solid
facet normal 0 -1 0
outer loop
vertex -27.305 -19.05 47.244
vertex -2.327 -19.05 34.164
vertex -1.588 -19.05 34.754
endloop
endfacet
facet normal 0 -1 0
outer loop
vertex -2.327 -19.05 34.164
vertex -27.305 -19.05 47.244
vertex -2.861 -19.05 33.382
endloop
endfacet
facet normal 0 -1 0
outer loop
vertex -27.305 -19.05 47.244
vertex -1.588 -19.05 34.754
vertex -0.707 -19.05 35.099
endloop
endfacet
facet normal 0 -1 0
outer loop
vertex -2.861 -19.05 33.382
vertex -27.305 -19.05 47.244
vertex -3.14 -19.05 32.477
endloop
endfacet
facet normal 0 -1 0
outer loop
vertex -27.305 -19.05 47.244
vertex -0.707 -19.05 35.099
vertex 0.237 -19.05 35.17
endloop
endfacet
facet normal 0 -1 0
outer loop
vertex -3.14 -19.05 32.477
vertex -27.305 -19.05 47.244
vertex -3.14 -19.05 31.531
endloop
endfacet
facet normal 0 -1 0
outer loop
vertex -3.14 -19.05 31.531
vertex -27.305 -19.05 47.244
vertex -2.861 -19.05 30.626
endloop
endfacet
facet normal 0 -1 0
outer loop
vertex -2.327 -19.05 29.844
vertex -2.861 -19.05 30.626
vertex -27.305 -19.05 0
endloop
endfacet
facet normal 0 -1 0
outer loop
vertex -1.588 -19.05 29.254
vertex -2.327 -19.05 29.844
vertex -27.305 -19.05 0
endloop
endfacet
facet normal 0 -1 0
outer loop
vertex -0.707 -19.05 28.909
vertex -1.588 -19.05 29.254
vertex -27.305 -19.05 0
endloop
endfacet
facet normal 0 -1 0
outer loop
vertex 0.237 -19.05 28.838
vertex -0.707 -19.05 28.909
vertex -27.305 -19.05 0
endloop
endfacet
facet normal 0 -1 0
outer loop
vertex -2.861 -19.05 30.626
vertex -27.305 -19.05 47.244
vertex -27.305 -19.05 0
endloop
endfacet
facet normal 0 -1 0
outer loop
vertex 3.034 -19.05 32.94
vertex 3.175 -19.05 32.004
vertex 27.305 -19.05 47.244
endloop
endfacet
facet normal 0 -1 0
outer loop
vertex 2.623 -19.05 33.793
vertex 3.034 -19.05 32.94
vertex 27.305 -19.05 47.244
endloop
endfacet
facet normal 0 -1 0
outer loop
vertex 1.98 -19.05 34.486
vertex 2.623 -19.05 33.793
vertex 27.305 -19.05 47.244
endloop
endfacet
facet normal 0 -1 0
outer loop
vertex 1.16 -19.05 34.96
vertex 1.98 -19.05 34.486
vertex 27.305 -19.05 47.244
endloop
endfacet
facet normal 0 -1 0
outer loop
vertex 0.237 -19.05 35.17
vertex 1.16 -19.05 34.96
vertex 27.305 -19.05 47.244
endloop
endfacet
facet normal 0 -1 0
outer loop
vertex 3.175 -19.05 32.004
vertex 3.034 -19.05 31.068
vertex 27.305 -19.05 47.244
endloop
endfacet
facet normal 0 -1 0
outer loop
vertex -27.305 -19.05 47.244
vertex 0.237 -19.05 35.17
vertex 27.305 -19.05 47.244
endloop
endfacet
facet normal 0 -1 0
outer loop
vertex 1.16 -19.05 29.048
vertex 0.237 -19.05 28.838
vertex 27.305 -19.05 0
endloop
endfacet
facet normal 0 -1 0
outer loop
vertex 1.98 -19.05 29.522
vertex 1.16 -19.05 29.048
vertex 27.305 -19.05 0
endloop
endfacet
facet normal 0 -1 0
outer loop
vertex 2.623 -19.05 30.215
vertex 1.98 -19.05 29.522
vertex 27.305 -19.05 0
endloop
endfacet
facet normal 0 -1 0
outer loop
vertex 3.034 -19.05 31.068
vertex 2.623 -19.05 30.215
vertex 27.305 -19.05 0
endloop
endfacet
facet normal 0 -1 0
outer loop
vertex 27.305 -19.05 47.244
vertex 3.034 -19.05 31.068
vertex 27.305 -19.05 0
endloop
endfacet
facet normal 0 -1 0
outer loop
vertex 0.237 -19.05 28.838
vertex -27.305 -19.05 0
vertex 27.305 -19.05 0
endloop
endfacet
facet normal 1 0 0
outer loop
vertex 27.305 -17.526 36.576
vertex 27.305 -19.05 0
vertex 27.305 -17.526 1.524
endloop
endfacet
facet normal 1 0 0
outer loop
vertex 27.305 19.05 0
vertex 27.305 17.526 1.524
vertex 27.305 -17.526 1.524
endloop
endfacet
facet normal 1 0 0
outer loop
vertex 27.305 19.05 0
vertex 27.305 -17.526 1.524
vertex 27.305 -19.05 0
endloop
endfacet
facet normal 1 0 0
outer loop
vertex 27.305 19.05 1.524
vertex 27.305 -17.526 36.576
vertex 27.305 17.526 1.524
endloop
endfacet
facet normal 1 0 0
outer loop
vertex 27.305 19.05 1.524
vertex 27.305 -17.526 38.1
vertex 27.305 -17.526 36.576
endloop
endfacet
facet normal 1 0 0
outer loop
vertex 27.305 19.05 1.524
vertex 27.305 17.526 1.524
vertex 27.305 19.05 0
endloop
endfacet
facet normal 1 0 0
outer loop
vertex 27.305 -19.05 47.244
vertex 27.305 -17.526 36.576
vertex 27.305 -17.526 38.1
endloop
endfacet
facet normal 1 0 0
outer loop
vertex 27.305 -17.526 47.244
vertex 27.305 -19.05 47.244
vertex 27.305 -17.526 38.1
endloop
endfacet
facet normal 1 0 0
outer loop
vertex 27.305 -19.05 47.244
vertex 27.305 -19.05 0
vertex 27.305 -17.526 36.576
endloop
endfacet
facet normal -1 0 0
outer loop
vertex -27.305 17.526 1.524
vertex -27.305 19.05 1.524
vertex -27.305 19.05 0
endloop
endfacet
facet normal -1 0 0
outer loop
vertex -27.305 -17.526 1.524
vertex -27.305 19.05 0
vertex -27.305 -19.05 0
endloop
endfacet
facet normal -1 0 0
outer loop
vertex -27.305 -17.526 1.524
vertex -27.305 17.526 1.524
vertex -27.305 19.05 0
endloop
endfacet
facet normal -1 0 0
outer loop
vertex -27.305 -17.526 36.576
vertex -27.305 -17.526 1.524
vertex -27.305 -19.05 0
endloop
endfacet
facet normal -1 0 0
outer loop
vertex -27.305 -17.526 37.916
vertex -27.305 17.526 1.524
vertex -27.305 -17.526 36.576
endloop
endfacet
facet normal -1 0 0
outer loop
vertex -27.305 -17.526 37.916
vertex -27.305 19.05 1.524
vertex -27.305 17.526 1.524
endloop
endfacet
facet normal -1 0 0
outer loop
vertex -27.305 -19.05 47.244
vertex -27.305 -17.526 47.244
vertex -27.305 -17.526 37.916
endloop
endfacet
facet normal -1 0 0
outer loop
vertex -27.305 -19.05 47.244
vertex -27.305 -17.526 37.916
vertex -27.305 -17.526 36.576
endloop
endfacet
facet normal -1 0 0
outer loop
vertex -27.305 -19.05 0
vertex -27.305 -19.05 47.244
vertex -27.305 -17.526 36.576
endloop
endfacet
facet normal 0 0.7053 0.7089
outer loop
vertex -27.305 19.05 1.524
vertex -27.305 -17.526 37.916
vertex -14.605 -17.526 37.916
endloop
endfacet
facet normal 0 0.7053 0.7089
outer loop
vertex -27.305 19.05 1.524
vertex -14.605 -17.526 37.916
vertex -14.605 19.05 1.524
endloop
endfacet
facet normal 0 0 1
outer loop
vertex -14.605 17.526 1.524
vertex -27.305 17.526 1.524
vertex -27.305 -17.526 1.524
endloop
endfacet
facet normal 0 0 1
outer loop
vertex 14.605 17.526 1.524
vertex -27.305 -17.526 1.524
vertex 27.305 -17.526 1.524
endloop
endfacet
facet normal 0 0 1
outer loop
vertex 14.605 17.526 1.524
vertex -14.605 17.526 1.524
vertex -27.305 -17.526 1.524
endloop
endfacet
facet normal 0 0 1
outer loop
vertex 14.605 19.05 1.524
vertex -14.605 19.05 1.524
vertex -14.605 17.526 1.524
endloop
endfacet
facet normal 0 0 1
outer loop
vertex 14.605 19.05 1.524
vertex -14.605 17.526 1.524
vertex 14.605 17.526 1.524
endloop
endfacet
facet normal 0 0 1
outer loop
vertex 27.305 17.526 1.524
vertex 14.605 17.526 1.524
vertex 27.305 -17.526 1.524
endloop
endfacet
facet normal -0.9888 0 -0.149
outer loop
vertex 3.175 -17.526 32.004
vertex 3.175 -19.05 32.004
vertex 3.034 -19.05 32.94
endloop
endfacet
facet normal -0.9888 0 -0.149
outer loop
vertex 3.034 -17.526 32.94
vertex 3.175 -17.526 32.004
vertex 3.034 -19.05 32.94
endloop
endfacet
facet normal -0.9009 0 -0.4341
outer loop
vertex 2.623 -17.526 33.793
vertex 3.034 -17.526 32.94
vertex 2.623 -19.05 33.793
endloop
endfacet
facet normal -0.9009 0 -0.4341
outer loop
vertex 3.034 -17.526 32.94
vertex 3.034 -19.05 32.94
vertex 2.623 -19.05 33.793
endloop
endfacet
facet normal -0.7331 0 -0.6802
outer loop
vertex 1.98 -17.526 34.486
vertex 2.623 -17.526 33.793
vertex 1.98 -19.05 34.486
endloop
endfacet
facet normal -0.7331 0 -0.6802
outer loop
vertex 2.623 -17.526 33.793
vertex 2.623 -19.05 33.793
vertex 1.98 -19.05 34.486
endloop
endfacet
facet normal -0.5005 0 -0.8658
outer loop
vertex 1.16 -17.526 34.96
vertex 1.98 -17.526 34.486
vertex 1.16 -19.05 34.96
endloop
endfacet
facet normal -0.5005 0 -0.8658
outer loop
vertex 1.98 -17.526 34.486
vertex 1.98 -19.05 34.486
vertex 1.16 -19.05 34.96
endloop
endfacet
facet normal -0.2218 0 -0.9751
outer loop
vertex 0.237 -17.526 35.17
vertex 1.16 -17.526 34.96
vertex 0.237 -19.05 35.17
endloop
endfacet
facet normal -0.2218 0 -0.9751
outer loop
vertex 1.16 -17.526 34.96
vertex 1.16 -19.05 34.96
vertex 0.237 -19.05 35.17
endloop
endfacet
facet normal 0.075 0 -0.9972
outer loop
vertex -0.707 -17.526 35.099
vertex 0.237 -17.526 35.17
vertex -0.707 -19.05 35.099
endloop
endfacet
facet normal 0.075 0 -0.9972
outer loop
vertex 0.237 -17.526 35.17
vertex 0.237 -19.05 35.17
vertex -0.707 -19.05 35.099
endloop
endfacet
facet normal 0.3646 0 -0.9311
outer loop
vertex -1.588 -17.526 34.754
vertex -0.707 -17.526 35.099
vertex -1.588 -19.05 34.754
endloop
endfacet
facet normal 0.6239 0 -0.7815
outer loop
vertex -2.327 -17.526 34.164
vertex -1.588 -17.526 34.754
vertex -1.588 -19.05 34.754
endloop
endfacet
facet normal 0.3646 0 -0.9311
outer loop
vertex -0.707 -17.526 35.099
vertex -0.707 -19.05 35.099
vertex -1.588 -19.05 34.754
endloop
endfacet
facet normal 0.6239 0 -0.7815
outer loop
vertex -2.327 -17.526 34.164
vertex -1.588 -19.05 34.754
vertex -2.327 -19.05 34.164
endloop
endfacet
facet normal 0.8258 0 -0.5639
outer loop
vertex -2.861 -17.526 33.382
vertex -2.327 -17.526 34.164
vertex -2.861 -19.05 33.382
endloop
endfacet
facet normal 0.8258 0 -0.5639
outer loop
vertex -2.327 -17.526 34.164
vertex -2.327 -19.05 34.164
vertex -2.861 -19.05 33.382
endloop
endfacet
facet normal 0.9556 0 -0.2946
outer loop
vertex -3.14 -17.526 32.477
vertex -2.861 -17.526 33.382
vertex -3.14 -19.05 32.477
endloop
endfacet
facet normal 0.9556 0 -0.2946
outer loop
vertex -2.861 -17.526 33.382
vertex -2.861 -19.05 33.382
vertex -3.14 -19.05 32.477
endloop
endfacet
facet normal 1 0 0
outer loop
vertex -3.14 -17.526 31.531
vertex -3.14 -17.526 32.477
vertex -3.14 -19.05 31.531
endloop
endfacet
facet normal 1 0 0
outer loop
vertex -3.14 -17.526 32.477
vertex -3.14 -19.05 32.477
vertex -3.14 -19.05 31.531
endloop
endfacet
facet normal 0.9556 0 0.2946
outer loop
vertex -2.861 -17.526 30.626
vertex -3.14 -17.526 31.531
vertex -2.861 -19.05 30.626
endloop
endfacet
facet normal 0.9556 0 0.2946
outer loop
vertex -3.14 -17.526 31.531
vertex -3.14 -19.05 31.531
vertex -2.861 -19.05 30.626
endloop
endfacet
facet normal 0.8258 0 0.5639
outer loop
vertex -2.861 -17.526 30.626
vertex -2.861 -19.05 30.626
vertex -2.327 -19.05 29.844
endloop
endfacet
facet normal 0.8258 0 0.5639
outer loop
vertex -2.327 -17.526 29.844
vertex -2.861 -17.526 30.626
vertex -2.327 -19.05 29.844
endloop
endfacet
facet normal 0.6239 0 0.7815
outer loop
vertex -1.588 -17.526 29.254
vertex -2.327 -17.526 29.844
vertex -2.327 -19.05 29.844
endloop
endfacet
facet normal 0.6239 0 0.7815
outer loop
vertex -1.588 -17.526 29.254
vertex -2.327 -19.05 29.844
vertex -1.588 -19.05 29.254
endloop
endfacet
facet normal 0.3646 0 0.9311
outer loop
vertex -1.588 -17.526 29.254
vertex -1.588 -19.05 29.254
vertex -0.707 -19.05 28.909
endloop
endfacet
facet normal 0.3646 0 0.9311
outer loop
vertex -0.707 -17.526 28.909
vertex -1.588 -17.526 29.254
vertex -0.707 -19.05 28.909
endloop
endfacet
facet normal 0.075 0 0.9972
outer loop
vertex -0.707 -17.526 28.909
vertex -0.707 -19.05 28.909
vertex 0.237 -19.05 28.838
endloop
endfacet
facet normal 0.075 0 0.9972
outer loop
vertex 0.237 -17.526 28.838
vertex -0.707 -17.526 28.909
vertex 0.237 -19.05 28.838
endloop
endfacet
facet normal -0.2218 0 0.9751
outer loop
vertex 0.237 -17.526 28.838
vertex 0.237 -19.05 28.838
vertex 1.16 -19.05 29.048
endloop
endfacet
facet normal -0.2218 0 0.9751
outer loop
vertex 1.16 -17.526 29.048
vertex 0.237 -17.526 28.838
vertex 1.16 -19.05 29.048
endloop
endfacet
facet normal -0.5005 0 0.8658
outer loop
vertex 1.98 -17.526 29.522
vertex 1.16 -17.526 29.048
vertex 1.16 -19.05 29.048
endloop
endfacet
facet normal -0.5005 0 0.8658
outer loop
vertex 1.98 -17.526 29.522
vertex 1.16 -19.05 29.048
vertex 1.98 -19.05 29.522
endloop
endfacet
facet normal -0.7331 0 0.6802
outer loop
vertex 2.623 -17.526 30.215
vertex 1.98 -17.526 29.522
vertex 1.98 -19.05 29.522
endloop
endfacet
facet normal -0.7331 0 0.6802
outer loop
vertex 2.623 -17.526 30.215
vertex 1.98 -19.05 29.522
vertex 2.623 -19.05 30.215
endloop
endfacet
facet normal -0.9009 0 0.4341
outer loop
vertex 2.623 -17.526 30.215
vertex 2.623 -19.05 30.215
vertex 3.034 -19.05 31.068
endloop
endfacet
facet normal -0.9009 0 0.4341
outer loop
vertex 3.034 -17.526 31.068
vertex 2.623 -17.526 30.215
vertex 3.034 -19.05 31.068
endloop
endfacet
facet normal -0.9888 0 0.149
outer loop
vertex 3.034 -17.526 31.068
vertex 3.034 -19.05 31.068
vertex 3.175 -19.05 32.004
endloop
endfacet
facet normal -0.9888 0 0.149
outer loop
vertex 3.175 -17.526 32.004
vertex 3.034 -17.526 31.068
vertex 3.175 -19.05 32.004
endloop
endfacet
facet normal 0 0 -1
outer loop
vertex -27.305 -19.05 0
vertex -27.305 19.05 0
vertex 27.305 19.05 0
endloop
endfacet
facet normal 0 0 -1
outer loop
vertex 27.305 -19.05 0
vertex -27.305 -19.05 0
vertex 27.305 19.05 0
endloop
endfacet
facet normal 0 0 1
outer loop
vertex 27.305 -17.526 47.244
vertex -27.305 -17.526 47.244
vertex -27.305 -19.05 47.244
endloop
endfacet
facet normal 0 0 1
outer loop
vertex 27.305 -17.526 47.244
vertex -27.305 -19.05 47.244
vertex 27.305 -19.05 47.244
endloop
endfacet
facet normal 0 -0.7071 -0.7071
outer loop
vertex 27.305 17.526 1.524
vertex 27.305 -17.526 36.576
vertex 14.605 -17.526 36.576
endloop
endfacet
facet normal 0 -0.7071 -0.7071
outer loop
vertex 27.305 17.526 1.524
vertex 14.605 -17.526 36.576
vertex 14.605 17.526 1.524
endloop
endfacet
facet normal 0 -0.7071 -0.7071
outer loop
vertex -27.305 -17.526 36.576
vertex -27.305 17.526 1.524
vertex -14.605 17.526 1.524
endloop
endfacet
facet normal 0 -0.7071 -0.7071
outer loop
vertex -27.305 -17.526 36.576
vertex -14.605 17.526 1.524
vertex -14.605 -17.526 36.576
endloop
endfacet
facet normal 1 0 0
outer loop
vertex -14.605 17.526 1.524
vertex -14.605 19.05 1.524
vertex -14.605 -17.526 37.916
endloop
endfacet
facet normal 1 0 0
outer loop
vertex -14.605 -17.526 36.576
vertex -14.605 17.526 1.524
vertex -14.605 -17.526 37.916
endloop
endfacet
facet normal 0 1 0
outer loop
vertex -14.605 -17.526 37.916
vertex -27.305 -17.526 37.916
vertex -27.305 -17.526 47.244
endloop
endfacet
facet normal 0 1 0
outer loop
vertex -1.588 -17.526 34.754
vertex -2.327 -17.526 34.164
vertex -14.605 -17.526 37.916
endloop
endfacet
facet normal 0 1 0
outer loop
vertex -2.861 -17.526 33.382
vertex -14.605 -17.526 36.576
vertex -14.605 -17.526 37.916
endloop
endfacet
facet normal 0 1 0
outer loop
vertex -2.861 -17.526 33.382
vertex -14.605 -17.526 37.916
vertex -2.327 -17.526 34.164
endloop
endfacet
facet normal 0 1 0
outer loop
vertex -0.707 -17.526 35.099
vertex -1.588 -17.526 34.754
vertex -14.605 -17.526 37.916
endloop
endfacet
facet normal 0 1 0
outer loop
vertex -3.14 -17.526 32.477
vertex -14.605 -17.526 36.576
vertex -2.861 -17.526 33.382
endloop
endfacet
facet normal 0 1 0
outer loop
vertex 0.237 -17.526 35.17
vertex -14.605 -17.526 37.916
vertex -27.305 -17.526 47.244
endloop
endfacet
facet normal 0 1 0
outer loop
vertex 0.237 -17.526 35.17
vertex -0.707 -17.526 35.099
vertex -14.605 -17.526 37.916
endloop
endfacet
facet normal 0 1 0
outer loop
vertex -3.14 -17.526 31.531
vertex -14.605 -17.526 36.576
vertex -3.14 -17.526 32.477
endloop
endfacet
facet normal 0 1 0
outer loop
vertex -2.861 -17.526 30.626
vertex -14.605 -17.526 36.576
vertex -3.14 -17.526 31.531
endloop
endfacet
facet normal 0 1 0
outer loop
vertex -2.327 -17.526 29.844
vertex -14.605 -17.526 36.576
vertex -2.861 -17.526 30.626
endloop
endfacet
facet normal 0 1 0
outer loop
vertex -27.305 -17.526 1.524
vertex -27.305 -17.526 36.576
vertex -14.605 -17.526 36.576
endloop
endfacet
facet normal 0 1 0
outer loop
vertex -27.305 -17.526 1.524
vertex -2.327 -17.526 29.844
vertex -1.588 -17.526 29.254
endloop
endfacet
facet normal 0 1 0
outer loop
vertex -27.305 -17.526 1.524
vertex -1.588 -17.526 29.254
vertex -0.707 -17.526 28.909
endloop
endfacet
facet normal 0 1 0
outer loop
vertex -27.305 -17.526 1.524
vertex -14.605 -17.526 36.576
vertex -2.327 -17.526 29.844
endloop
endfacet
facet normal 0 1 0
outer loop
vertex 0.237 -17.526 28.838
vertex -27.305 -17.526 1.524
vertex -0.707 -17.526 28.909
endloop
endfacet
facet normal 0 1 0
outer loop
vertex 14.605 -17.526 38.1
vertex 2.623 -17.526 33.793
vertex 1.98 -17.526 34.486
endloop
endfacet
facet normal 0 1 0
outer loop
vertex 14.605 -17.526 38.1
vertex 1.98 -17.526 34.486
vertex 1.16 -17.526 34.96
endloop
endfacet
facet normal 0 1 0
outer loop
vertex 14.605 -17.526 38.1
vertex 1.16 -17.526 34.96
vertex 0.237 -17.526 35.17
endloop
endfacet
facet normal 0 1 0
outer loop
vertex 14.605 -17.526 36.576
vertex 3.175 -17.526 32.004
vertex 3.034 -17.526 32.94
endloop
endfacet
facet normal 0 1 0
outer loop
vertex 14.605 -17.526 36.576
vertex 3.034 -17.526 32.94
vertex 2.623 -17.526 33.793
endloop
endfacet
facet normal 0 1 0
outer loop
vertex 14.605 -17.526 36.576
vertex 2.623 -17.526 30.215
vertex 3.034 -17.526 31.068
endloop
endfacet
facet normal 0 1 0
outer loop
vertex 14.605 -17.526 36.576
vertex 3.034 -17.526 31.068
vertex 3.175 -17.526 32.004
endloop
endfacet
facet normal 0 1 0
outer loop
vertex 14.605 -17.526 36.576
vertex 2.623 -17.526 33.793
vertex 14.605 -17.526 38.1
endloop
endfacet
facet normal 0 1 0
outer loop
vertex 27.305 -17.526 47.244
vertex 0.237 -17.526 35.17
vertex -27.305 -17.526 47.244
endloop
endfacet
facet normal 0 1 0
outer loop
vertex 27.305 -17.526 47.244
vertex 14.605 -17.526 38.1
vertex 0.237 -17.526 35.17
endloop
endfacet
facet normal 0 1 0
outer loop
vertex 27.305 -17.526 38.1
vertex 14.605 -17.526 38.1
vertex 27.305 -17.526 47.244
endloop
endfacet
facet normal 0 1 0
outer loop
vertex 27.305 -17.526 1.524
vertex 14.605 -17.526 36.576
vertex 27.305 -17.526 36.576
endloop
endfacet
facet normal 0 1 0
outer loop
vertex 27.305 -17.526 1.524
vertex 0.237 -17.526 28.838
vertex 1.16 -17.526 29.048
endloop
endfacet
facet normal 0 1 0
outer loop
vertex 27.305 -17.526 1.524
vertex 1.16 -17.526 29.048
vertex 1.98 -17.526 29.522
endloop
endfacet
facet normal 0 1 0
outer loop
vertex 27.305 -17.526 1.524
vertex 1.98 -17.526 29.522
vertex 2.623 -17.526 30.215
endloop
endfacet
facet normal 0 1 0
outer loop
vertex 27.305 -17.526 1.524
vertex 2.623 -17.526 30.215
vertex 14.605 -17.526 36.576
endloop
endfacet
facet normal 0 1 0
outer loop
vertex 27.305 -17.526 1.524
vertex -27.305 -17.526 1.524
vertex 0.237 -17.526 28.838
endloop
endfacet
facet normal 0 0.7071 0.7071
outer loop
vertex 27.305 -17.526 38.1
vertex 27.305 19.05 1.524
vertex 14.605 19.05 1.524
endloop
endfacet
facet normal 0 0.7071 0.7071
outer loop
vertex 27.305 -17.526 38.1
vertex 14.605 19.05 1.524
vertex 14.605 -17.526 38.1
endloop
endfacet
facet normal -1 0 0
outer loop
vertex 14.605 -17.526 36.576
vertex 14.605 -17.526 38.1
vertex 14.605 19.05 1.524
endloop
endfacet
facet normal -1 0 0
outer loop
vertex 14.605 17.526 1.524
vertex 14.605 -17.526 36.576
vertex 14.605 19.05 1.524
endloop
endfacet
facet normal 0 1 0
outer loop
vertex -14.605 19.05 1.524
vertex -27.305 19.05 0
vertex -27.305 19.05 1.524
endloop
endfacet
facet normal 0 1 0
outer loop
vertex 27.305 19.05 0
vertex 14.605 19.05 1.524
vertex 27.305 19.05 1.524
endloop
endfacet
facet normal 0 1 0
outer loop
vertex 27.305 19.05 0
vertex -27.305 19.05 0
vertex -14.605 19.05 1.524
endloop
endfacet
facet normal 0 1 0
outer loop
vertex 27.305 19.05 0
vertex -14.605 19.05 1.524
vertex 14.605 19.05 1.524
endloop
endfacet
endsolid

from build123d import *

# Parameters (mm, degrees)
F0_W     = 54.61
F0_H     = 38.1
F1_DEPTH = 1.524
F2_W     = 54.61
F2_H     = 1.524
F3_DEPTH = 45.72
F4_R     = 3.175
F5_DEPTH = 25.4
F7_DEPTH = 12.7
F9_DEPTH = 12.7


with BuildPart() as f1:
    # F0 (on Top) → F1 (new body)
    with BuildSketch(Plane.XY):
        Rectangle(F0_W, F0_H)
    extrude(amount=F1_DEPTH)

    # F2 (on face) → F3 (join)
    with BuildSketch(Plane.XY.offset(1.524)):
        with Locations((0, -18.288)):
            Rectangle(F2_W, F2_H)
    extrude(amount=F3_DEPTH)

    # F4 (on face) → F5 (cut)
    with BuildSketch(Plane.XZ.offset(19.05)):
        with Locations((0, 32.004)):
            Circle(F4_R)
    extrude(amount=-F5_DEPTH, mode=Mode.SUBTRACT)

    # F6 (on face) → F7 (join)
    with BuildSketch(Plane.YZ.offset(27.305)):
        Polygon((17.526, 1.524), (19.05, 1.524), (-17.526, 38.1), (-17.526, 36.576), align=None)
    extrude(amount=-F7_DEPTH)

    # F8 (on face) → F9 (join)
    with BuildSketch(Plane(origin=(-27.305, 0, 0), x_dir=(0, -1, 0), z_dir=(-1, 0, 0))):
        Polygon((17.526, 37.915688), (-19.05, 1.524), (-17.526, 1.524), (17.526, 36.576), align=None)
    extrude(amount=-F9_DEPTH)


solid = f1.part
